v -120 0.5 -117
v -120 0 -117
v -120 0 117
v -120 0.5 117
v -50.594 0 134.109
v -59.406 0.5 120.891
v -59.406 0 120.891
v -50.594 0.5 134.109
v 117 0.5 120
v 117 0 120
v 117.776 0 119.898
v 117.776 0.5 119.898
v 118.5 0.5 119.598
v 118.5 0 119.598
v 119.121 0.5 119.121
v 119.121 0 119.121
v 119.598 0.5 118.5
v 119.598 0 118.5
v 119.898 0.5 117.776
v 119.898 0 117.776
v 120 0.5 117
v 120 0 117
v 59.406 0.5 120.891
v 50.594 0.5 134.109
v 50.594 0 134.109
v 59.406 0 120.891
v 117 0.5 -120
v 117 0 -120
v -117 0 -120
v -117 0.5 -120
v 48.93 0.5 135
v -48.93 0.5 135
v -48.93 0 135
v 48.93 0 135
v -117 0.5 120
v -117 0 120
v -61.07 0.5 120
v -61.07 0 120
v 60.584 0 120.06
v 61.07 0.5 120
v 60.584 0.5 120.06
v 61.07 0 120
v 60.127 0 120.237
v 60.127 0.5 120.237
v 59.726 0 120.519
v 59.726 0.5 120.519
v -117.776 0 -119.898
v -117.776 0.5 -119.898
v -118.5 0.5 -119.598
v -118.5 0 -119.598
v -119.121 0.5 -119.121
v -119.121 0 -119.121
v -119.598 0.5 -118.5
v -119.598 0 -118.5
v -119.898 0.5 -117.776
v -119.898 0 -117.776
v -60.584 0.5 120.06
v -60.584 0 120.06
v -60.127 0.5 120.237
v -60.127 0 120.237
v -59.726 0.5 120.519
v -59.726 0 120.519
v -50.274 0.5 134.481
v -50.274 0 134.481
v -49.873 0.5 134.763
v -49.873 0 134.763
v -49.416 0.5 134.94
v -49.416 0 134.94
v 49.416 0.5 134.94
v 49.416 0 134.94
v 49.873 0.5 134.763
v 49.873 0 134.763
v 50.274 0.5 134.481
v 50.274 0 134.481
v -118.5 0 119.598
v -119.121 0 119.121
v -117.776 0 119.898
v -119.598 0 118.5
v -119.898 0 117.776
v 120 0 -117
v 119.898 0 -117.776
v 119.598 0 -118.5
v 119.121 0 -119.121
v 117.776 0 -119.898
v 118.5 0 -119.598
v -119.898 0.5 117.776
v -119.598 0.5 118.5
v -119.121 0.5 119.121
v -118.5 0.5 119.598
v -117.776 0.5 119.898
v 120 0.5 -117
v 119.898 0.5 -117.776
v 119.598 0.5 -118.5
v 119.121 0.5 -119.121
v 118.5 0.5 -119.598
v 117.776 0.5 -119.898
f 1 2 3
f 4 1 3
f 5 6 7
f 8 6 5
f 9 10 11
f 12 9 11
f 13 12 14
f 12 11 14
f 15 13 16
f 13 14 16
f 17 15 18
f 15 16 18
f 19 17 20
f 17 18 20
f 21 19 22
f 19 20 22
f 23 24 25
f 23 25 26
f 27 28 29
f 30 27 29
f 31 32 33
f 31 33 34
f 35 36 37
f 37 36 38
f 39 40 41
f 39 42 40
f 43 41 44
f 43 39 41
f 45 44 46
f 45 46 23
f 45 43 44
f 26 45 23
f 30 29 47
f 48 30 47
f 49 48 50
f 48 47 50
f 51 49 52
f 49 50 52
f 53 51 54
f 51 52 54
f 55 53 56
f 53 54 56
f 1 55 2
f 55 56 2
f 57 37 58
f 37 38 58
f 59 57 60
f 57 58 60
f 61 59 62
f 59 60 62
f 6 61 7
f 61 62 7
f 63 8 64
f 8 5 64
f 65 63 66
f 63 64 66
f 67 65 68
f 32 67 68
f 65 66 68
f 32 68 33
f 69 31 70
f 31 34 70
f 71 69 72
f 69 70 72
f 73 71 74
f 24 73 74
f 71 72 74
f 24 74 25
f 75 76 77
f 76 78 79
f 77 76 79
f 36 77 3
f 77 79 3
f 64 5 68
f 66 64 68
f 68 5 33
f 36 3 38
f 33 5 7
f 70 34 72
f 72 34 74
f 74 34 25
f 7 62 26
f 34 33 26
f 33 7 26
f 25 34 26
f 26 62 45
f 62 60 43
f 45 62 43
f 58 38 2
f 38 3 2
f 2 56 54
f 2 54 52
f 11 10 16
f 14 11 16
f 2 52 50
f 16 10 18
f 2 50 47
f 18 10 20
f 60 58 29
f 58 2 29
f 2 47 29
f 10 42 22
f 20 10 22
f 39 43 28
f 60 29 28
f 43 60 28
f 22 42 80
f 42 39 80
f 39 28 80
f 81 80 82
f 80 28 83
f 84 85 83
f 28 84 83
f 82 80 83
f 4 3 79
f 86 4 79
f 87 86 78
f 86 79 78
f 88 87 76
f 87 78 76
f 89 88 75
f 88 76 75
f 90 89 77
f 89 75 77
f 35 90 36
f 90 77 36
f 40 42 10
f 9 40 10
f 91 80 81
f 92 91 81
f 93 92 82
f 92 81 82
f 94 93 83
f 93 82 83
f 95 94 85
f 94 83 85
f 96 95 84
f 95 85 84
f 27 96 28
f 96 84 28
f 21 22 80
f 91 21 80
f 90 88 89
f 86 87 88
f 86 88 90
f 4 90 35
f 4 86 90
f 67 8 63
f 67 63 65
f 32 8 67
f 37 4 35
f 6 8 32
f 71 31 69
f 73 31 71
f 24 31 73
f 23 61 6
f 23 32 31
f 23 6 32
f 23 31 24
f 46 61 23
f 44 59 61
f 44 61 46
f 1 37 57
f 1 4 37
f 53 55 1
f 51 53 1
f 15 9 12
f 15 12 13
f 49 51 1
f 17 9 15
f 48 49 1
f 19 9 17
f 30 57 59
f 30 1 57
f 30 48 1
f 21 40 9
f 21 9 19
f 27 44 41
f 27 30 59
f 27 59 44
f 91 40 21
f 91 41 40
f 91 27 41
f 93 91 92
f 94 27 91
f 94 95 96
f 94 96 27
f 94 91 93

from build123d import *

# Parameters (mm, degrees)
AUFSATZ_LINEAR_AUSTRAGEN1_DEPTH = 0.5
BOSS_EXTRUDE1_DEPTH             = 0.5
FILLET1_R                       = 2


with BuildPart() as part:
    # Skizze1 → Aufsatz-Linear austragen1 (new body)
    with BuildSketch(Plane(origin=(0, 0, 0), x_dir=(1, 0, 0), z_dir=(0, 1, 0))):
        with BuildLine():
            Line((-117, -120), (117, -120))
            ThreePointArc((117, -120), (119.121320344, -119.121320344), (120, -117))
            Line((120, -117), (120, 117))
            ThreePointArc((120, 117), (119.121320344, 119.121320344), (117, 120))
            Line((117, 120), (-117, 120))
            ThreePointArc((-117, 120), (-119.121320344, 119.121320344), (-120, 117))
            Line((-120, 117), (-120, -117))
            ThreePointArc((-120, -117), (-119.121320344, -119.121320344), (-117, -120))
        make_face()
    extrude(amount=AUFSATZ_LINEAR_AUSTRAGEN1_DEPTH)

    # Sketch1 → Boss-Extrude1 (add)
    with BuildSketch(Plane(origin=(0, 0.5, 0), x_dir=(1, 0, 0), z_dir=(0, 1, 0))):
        Polygon((-60, -120), (-50, -135), (50, -135), (60, -120), align=None)
    extrude(amount=-BOSS_EXTRUDE1_DEPTH)

    # Fillet1
    fillet1_edges = [part.edges().sort_by_distance(p)[0] for p in [
        (-60, 0.25, 120),
        (60, 0.25, 120),
        (50, 0.25, 135),
        (-50, 0.25, 135),
    ]]
    fillet(fillet1_edges, radius=FILLET1_R)


solid = part.part
